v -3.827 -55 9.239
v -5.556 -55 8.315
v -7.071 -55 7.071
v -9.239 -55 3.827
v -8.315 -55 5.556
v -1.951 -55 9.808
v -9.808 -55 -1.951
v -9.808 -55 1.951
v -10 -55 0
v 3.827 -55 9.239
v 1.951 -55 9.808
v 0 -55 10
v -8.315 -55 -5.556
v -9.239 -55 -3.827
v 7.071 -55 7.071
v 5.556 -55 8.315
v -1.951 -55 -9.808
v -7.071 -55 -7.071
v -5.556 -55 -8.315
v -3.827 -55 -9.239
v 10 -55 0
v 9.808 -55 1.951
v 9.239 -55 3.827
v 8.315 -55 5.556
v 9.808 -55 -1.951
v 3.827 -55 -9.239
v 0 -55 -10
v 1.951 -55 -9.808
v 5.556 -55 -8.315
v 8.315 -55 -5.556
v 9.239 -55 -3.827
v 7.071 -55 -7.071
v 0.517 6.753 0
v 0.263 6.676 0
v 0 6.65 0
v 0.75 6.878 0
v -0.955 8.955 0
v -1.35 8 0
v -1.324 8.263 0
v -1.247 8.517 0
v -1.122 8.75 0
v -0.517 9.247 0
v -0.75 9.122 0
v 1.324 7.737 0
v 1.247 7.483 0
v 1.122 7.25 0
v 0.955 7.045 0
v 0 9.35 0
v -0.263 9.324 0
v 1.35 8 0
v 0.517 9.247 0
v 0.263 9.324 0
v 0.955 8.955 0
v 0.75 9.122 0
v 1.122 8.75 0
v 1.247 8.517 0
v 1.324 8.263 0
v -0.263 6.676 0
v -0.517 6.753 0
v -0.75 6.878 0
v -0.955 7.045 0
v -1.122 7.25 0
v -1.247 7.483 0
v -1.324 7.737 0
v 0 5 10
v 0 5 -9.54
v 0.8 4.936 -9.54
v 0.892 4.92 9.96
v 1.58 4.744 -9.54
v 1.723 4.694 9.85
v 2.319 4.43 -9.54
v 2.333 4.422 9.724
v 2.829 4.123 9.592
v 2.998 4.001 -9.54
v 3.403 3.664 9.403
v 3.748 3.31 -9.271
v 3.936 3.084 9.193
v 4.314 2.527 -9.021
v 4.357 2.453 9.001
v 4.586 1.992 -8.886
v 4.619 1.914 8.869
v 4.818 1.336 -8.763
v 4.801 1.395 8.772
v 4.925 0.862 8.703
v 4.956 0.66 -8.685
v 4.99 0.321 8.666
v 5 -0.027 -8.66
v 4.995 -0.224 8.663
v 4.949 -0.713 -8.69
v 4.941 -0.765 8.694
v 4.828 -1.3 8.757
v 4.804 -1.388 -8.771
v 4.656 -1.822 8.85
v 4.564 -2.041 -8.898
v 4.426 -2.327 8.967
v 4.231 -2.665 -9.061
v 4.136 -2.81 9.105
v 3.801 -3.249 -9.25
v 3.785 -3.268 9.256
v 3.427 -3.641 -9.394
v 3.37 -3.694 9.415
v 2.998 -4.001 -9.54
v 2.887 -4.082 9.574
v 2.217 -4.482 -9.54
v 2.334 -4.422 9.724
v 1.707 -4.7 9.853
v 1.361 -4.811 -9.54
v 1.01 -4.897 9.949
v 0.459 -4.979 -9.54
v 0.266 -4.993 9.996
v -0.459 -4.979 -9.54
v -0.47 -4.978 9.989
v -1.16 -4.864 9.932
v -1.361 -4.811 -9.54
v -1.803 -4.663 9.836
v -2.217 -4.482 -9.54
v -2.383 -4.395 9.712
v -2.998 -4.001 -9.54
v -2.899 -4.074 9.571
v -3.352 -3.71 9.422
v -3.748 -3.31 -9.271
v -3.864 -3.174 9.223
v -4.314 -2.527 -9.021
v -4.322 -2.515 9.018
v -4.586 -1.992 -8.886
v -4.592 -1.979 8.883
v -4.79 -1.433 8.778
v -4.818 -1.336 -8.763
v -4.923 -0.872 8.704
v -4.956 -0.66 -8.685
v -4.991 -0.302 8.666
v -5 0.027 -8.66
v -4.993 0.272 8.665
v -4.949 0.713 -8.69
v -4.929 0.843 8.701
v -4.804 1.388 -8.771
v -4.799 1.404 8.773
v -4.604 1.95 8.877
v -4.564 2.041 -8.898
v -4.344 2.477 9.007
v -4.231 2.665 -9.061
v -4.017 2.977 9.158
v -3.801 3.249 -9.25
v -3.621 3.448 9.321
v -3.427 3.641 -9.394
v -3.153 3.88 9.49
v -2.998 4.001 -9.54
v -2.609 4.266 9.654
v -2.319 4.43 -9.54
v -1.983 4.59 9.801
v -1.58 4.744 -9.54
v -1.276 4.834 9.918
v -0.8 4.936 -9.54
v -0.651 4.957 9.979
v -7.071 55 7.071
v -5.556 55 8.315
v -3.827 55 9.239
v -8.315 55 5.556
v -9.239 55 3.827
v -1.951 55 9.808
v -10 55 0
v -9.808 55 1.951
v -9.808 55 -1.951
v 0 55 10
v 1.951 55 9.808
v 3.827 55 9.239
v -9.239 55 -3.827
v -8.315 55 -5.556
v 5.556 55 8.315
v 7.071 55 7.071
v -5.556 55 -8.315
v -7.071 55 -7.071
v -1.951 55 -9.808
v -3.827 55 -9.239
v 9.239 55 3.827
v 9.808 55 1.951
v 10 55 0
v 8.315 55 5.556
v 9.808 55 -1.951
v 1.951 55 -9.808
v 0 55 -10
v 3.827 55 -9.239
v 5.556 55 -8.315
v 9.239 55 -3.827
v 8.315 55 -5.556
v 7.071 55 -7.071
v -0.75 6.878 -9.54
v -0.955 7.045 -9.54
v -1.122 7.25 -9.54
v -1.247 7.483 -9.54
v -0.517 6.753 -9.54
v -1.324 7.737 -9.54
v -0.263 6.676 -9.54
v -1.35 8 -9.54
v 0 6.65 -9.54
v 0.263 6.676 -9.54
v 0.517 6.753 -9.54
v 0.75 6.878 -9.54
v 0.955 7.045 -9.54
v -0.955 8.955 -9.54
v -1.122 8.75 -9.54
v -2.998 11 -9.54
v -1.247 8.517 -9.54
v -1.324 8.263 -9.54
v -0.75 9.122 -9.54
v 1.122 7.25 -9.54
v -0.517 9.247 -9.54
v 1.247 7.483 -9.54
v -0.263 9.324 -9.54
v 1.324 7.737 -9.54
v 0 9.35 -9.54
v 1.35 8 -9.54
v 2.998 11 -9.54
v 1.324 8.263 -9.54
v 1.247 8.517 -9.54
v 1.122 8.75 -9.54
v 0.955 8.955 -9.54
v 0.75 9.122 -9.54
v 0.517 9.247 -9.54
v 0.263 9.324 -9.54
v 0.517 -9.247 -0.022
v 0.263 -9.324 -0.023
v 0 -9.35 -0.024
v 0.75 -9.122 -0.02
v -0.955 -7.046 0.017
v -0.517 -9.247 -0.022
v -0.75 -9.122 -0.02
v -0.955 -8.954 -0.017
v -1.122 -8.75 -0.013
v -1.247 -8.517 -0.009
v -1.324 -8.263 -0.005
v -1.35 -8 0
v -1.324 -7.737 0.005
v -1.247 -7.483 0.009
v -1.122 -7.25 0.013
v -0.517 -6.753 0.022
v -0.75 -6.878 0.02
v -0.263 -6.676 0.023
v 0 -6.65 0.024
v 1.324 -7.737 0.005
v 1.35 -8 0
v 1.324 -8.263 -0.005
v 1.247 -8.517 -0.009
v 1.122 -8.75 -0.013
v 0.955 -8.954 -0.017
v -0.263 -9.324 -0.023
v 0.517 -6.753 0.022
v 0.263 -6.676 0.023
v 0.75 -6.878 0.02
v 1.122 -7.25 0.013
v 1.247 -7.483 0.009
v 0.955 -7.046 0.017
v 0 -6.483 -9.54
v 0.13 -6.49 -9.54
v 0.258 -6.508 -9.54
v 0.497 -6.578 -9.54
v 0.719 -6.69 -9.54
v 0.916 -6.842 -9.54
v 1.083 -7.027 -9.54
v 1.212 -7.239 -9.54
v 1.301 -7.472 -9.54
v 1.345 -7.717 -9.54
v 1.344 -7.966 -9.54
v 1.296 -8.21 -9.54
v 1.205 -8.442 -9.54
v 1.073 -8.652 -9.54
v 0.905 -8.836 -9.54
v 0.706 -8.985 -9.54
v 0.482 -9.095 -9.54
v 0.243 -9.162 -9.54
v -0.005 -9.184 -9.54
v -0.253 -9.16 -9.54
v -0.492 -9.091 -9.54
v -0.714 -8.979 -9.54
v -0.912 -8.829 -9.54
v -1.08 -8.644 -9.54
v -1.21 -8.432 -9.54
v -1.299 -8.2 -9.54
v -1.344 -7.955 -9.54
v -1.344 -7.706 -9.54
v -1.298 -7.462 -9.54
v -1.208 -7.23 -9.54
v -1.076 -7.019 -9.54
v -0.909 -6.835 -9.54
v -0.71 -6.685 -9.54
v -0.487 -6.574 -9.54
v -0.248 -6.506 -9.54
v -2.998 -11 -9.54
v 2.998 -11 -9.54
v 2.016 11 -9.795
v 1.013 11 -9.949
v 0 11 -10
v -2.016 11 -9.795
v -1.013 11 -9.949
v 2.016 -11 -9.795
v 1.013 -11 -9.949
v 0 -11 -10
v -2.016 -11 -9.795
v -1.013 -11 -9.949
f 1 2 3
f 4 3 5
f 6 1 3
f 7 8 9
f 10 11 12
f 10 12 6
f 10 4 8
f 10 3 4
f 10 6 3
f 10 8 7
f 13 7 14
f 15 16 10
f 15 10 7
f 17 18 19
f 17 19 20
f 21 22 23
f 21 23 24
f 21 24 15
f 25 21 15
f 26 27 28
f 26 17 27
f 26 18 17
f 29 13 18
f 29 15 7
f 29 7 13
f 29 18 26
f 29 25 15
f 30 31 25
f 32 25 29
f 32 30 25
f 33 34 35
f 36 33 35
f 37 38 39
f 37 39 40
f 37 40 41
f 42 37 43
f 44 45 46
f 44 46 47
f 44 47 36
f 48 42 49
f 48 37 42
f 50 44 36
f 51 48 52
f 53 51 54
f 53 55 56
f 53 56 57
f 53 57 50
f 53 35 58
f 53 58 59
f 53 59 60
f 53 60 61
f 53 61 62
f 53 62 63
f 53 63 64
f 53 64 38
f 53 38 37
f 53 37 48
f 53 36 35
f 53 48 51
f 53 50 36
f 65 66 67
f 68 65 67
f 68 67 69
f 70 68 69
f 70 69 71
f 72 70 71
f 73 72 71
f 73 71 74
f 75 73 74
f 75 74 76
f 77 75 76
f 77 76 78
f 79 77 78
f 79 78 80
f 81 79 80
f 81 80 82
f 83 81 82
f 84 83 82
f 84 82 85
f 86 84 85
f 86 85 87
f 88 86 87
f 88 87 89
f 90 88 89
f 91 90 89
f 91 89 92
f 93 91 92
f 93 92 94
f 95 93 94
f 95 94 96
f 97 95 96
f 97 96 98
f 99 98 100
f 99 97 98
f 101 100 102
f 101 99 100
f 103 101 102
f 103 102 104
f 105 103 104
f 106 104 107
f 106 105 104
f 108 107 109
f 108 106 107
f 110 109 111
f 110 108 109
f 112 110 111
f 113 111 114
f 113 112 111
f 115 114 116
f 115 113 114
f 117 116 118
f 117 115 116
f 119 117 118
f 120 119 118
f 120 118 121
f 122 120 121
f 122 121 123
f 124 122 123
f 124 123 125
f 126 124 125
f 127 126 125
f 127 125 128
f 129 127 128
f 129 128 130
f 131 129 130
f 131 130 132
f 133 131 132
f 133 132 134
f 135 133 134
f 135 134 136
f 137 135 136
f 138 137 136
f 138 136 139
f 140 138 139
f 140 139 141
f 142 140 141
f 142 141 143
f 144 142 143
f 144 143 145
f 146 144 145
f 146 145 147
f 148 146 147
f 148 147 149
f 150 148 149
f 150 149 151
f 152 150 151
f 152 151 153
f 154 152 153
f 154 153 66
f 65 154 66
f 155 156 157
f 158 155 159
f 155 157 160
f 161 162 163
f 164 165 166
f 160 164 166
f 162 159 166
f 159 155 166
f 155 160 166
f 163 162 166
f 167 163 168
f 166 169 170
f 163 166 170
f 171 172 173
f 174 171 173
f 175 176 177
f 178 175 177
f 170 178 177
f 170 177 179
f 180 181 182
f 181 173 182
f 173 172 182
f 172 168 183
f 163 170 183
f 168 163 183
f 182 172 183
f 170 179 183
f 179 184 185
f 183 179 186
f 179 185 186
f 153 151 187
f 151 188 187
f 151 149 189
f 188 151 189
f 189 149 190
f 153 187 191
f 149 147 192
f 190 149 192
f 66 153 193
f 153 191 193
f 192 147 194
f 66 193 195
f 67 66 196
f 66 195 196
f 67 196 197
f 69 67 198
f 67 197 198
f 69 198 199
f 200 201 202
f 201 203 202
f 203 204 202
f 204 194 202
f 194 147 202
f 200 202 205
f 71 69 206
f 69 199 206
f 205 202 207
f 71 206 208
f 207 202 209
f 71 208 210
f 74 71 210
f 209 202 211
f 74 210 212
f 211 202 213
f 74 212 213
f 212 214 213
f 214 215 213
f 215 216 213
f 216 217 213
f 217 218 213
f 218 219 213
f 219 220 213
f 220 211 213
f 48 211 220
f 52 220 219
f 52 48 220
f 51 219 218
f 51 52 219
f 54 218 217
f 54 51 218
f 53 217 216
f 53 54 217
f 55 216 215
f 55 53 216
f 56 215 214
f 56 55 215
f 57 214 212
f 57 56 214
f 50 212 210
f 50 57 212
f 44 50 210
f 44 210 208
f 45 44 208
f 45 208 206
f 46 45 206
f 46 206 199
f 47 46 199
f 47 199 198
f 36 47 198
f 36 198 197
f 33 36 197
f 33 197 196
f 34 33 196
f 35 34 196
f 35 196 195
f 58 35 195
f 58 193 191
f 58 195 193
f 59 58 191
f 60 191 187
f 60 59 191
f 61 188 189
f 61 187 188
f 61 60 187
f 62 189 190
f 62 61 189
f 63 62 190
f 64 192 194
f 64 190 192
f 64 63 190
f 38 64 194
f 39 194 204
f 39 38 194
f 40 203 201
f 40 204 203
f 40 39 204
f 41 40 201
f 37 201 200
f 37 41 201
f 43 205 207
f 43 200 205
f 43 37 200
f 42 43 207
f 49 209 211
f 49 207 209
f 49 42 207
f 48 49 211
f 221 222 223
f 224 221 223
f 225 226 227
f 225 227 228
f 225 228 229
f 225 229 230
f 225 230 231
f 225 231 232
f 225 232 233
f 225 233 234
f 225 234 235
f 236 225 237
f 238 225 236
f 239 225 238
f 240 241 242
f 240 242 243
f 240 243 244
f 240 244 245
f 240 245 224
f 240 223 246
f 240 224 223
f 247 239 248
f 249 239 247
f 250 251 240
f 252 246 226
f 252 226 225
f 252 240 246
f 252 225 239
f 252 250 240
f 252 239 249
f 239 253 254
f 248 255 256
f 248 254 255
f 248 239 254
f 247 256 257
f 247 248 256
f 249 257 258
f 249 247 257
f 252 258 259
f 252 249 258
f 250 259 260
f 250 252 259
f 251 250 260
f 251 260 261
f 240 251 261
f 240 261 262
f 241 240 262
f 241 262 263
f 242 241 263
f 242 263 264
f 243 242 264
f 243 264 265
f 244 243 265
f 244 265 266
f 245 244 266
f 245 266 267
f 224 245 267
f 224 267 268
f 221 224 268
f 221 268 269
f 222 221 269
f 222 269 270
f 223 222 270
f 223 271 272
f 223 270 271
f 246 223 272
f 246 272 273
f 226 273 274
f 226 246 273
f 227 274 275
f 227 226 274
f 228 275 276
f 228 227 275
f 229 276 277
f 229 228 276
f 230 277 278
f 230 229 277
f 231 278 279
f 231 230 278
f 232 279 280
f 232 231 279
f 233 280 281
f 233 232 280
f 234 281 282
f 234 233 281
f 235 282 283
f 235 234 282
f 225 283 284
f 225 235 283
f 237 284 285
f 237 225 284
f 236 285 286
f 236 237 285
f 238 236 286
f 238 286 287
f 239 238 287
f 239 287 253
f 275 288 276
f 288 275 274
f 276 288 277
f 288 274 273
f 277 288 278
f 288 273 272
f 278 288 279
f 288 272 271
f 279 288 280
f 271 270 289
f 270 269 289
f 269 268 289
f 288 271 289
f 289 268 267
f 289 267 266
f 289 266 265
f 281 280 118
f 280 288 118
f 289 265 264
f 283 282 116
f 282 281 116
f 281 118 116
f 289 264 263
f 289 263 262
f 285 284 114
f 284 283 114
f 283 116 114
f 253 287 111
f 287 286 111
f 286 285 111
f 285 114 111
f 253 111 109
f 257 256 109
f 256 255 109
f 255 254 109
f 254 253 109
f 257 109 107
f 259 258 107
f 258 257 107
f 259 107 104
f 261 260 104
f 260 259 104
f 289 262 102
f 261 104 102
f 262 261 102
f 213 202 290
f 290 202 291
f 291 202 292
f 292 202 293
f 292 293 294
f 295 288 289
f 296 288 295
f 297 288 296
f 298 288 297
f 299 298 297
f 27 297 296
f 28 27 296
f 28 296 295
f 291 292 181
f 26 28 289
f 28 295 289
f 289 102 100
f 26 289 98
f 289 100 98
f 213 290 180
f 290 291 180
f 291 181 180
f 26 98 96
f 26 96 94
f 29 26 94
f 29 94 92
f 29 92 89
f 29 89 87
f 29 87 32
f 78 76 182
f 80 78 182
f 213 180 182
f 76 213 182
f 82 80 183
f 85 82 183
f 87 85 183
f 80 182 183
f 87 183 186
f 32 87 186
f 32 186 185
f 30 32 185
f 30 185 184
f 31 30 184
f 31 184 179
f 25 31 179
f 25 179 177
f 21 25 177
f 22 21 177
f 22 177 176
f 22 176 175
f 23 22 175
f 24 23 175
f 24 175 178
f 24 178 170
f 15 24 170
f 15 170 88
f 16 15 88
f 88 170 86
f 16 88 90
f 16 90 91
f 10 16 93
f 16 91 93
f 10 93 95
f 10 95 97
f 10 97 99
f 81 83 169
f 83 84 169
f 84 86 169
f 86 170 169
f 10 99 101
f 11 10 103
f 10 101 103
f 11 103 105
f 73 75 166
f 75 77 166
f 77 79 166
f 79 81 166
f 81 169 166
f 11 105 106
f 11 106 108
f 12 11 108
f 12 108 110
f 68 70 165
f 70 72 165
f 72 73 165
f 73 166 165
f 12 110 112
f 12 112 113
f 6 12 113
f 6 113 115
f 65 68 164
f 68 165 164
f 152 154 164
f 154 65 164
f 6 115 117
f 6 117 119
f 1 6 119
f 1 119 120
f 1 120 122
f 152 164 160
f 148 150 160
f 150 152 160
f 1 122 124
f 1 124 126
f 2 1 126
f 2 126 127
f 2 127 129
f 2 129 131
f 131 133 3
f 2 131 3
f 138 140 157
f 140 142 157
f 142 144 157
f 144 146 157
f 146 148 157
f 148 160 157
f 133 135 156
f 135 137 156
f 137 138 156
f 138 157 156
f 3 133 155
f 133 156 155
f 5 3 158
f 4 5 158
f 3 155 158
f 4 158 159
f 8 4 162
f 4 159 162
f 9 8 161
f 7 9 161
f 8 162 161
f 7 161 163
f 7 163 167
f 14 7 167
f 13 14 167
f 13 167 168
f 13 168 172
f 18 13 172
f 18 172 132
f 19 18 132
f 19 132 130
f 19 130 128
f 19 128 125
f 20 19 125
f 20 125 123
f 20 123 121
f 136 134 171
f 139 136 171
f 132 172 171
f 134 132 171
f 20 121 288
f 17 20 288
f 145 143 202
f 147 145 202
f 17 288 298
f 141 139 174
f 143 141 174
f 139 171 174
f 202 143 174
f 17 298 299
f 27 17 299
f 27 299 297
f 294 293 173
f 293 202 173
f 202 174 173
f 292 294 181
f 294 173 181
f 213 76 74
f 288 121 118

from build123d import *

# Parameters (mm, degrees)
CYLINDER008_R               = 1.35
CYLINDER008_DEPTH           = 10
CYLINDER008_PLACEMENT_ANGLE = 91
CYLINDER007_R               = 1.35
CYLINDER007_DEPTH           = 10
CYLINDER007_PITCH_ANGLE     = 90
CYLINDER006_R               = 5
CYLINDER006_DEPTH           = 20
CYLINDER006_PITCH_ANGLE     = 90
BOX001_W                    = 10
BOX001_H                    = 6
BOX001_DEPTH                = 22
CYLINDER005_R               = 10
CYLINDER005_DEPTH           = 110
CUT007_PITCH_ANGLE          = 90
CUT007_PLACEMENT_ANGLE      = -90


with BuildPart() as cylinder008:
    # Cylinder008 → Cylinder008 (new body)
    with BuildSketch(Plane.XY):
        Circle(CYLINDER008_R)
    extrude(amount=CYLINDER008_DEPTH)


with BuildPart() as cylinder008_1:
    # Cylinder008 placement: moved
    add(cylinder008.part.moved(Location((0, 0, 85))).rotate(Axis((0, 0, 85), (0, 1, 0)), CYLINDER008_PLACEMENT_ANGLE))


with BuildPart() as cylinder007:
    # Cylinder007 → Cylinder007 (new body)
    with BuildSketch(Plane.XY):
        Circle(CYLINDER007_R)
    extrude(amount=CYLINDER007_DEPTH)


with BuildPart() as cylinder007_1:
    # Cylinder007 pitch: moved
    add(cylinder007.part.rotate(Axis((0, 0, 0), (0, 1, 0)), CYLINDER007_PITCH_ANGLE))


with BuildPart() as cylinder007_2:
    # Cylinder007 placement: moved
    add(cylinder007_1.part.moved(Location((0, 0, 69))))


with BuildPart() as cylinder006:
    # Cylinder006 → Cylinder006 (new body)
    with BuildSketch(Plane.XY):
        Circle(CYLINDER006_R)
    extrude(amount=CYLINDER006_DEPTH)


with BuildPart() as cylinder006_1:
    # Cylinder006 pitch: moved
    add(cylinder006.part.rotate(Axis((0, 0, 0), (0, 1, 0)), CYLINDER006_PITCH_ANGLE))


with BuildPart() as cylinder006_2:
    # Cylinder006 placement: moved
    add(cylinder006_1.part.moved(Location((-10, 0, 77))))


with BuildPart() as cube001:
    # Box001 → Box001 (new body)
    with BuildSketch(Plane(origin=(9.54, -3, 66), x_dir=(1, 0, 0), z_dir=(0, 0, 1))):
        with Locations((5, 3)):
            Rectangle(BOX001_W, BOX001_H)
    extrude(amount=BOX001_DEPTH)


with BuildPart() as lever002:
    # Cylinder005 → Cylinder005 (new body)
    with BuildSketch(Plane.XY.offset(22)):
        Circle(CYLINDER005_R)
    extrude(amount=CYLINDER005_DEPTH)

    # Cut006: cut Cube001
    add(cube001.part, mode=Mode.SUBTRACT)

    # Cut004: cut Cylinder006
    add(cylinder006_2.part, mode=Mode.SUBTRACT)

    # Cut005: cut Cylinder007
    add(cylinder007_2.part, mode=Mode.SUBTRACT)

    # Cut007: cut Cylinder008
    add(cylinder008_1.part, mode=Mode.SUBTRACT)


with BuildPart() as lever002_1:
    # Cut007 pitch: moved
    add(lever002.part.rotate(Axis((0, 0, 0), (0, 1, 0)), CUT007_PITCH_ANGLE))


with BuildPart() as lever002_2:
    # Cut007 placement: moved
    add(lever002_1.part.moved(Location((0, 77, 0))).rotate(Axis((0, 77, 0), (0, 0, 1)), CUT007_PLACEMENT_ANGLE))


solid = lever002_2.part
